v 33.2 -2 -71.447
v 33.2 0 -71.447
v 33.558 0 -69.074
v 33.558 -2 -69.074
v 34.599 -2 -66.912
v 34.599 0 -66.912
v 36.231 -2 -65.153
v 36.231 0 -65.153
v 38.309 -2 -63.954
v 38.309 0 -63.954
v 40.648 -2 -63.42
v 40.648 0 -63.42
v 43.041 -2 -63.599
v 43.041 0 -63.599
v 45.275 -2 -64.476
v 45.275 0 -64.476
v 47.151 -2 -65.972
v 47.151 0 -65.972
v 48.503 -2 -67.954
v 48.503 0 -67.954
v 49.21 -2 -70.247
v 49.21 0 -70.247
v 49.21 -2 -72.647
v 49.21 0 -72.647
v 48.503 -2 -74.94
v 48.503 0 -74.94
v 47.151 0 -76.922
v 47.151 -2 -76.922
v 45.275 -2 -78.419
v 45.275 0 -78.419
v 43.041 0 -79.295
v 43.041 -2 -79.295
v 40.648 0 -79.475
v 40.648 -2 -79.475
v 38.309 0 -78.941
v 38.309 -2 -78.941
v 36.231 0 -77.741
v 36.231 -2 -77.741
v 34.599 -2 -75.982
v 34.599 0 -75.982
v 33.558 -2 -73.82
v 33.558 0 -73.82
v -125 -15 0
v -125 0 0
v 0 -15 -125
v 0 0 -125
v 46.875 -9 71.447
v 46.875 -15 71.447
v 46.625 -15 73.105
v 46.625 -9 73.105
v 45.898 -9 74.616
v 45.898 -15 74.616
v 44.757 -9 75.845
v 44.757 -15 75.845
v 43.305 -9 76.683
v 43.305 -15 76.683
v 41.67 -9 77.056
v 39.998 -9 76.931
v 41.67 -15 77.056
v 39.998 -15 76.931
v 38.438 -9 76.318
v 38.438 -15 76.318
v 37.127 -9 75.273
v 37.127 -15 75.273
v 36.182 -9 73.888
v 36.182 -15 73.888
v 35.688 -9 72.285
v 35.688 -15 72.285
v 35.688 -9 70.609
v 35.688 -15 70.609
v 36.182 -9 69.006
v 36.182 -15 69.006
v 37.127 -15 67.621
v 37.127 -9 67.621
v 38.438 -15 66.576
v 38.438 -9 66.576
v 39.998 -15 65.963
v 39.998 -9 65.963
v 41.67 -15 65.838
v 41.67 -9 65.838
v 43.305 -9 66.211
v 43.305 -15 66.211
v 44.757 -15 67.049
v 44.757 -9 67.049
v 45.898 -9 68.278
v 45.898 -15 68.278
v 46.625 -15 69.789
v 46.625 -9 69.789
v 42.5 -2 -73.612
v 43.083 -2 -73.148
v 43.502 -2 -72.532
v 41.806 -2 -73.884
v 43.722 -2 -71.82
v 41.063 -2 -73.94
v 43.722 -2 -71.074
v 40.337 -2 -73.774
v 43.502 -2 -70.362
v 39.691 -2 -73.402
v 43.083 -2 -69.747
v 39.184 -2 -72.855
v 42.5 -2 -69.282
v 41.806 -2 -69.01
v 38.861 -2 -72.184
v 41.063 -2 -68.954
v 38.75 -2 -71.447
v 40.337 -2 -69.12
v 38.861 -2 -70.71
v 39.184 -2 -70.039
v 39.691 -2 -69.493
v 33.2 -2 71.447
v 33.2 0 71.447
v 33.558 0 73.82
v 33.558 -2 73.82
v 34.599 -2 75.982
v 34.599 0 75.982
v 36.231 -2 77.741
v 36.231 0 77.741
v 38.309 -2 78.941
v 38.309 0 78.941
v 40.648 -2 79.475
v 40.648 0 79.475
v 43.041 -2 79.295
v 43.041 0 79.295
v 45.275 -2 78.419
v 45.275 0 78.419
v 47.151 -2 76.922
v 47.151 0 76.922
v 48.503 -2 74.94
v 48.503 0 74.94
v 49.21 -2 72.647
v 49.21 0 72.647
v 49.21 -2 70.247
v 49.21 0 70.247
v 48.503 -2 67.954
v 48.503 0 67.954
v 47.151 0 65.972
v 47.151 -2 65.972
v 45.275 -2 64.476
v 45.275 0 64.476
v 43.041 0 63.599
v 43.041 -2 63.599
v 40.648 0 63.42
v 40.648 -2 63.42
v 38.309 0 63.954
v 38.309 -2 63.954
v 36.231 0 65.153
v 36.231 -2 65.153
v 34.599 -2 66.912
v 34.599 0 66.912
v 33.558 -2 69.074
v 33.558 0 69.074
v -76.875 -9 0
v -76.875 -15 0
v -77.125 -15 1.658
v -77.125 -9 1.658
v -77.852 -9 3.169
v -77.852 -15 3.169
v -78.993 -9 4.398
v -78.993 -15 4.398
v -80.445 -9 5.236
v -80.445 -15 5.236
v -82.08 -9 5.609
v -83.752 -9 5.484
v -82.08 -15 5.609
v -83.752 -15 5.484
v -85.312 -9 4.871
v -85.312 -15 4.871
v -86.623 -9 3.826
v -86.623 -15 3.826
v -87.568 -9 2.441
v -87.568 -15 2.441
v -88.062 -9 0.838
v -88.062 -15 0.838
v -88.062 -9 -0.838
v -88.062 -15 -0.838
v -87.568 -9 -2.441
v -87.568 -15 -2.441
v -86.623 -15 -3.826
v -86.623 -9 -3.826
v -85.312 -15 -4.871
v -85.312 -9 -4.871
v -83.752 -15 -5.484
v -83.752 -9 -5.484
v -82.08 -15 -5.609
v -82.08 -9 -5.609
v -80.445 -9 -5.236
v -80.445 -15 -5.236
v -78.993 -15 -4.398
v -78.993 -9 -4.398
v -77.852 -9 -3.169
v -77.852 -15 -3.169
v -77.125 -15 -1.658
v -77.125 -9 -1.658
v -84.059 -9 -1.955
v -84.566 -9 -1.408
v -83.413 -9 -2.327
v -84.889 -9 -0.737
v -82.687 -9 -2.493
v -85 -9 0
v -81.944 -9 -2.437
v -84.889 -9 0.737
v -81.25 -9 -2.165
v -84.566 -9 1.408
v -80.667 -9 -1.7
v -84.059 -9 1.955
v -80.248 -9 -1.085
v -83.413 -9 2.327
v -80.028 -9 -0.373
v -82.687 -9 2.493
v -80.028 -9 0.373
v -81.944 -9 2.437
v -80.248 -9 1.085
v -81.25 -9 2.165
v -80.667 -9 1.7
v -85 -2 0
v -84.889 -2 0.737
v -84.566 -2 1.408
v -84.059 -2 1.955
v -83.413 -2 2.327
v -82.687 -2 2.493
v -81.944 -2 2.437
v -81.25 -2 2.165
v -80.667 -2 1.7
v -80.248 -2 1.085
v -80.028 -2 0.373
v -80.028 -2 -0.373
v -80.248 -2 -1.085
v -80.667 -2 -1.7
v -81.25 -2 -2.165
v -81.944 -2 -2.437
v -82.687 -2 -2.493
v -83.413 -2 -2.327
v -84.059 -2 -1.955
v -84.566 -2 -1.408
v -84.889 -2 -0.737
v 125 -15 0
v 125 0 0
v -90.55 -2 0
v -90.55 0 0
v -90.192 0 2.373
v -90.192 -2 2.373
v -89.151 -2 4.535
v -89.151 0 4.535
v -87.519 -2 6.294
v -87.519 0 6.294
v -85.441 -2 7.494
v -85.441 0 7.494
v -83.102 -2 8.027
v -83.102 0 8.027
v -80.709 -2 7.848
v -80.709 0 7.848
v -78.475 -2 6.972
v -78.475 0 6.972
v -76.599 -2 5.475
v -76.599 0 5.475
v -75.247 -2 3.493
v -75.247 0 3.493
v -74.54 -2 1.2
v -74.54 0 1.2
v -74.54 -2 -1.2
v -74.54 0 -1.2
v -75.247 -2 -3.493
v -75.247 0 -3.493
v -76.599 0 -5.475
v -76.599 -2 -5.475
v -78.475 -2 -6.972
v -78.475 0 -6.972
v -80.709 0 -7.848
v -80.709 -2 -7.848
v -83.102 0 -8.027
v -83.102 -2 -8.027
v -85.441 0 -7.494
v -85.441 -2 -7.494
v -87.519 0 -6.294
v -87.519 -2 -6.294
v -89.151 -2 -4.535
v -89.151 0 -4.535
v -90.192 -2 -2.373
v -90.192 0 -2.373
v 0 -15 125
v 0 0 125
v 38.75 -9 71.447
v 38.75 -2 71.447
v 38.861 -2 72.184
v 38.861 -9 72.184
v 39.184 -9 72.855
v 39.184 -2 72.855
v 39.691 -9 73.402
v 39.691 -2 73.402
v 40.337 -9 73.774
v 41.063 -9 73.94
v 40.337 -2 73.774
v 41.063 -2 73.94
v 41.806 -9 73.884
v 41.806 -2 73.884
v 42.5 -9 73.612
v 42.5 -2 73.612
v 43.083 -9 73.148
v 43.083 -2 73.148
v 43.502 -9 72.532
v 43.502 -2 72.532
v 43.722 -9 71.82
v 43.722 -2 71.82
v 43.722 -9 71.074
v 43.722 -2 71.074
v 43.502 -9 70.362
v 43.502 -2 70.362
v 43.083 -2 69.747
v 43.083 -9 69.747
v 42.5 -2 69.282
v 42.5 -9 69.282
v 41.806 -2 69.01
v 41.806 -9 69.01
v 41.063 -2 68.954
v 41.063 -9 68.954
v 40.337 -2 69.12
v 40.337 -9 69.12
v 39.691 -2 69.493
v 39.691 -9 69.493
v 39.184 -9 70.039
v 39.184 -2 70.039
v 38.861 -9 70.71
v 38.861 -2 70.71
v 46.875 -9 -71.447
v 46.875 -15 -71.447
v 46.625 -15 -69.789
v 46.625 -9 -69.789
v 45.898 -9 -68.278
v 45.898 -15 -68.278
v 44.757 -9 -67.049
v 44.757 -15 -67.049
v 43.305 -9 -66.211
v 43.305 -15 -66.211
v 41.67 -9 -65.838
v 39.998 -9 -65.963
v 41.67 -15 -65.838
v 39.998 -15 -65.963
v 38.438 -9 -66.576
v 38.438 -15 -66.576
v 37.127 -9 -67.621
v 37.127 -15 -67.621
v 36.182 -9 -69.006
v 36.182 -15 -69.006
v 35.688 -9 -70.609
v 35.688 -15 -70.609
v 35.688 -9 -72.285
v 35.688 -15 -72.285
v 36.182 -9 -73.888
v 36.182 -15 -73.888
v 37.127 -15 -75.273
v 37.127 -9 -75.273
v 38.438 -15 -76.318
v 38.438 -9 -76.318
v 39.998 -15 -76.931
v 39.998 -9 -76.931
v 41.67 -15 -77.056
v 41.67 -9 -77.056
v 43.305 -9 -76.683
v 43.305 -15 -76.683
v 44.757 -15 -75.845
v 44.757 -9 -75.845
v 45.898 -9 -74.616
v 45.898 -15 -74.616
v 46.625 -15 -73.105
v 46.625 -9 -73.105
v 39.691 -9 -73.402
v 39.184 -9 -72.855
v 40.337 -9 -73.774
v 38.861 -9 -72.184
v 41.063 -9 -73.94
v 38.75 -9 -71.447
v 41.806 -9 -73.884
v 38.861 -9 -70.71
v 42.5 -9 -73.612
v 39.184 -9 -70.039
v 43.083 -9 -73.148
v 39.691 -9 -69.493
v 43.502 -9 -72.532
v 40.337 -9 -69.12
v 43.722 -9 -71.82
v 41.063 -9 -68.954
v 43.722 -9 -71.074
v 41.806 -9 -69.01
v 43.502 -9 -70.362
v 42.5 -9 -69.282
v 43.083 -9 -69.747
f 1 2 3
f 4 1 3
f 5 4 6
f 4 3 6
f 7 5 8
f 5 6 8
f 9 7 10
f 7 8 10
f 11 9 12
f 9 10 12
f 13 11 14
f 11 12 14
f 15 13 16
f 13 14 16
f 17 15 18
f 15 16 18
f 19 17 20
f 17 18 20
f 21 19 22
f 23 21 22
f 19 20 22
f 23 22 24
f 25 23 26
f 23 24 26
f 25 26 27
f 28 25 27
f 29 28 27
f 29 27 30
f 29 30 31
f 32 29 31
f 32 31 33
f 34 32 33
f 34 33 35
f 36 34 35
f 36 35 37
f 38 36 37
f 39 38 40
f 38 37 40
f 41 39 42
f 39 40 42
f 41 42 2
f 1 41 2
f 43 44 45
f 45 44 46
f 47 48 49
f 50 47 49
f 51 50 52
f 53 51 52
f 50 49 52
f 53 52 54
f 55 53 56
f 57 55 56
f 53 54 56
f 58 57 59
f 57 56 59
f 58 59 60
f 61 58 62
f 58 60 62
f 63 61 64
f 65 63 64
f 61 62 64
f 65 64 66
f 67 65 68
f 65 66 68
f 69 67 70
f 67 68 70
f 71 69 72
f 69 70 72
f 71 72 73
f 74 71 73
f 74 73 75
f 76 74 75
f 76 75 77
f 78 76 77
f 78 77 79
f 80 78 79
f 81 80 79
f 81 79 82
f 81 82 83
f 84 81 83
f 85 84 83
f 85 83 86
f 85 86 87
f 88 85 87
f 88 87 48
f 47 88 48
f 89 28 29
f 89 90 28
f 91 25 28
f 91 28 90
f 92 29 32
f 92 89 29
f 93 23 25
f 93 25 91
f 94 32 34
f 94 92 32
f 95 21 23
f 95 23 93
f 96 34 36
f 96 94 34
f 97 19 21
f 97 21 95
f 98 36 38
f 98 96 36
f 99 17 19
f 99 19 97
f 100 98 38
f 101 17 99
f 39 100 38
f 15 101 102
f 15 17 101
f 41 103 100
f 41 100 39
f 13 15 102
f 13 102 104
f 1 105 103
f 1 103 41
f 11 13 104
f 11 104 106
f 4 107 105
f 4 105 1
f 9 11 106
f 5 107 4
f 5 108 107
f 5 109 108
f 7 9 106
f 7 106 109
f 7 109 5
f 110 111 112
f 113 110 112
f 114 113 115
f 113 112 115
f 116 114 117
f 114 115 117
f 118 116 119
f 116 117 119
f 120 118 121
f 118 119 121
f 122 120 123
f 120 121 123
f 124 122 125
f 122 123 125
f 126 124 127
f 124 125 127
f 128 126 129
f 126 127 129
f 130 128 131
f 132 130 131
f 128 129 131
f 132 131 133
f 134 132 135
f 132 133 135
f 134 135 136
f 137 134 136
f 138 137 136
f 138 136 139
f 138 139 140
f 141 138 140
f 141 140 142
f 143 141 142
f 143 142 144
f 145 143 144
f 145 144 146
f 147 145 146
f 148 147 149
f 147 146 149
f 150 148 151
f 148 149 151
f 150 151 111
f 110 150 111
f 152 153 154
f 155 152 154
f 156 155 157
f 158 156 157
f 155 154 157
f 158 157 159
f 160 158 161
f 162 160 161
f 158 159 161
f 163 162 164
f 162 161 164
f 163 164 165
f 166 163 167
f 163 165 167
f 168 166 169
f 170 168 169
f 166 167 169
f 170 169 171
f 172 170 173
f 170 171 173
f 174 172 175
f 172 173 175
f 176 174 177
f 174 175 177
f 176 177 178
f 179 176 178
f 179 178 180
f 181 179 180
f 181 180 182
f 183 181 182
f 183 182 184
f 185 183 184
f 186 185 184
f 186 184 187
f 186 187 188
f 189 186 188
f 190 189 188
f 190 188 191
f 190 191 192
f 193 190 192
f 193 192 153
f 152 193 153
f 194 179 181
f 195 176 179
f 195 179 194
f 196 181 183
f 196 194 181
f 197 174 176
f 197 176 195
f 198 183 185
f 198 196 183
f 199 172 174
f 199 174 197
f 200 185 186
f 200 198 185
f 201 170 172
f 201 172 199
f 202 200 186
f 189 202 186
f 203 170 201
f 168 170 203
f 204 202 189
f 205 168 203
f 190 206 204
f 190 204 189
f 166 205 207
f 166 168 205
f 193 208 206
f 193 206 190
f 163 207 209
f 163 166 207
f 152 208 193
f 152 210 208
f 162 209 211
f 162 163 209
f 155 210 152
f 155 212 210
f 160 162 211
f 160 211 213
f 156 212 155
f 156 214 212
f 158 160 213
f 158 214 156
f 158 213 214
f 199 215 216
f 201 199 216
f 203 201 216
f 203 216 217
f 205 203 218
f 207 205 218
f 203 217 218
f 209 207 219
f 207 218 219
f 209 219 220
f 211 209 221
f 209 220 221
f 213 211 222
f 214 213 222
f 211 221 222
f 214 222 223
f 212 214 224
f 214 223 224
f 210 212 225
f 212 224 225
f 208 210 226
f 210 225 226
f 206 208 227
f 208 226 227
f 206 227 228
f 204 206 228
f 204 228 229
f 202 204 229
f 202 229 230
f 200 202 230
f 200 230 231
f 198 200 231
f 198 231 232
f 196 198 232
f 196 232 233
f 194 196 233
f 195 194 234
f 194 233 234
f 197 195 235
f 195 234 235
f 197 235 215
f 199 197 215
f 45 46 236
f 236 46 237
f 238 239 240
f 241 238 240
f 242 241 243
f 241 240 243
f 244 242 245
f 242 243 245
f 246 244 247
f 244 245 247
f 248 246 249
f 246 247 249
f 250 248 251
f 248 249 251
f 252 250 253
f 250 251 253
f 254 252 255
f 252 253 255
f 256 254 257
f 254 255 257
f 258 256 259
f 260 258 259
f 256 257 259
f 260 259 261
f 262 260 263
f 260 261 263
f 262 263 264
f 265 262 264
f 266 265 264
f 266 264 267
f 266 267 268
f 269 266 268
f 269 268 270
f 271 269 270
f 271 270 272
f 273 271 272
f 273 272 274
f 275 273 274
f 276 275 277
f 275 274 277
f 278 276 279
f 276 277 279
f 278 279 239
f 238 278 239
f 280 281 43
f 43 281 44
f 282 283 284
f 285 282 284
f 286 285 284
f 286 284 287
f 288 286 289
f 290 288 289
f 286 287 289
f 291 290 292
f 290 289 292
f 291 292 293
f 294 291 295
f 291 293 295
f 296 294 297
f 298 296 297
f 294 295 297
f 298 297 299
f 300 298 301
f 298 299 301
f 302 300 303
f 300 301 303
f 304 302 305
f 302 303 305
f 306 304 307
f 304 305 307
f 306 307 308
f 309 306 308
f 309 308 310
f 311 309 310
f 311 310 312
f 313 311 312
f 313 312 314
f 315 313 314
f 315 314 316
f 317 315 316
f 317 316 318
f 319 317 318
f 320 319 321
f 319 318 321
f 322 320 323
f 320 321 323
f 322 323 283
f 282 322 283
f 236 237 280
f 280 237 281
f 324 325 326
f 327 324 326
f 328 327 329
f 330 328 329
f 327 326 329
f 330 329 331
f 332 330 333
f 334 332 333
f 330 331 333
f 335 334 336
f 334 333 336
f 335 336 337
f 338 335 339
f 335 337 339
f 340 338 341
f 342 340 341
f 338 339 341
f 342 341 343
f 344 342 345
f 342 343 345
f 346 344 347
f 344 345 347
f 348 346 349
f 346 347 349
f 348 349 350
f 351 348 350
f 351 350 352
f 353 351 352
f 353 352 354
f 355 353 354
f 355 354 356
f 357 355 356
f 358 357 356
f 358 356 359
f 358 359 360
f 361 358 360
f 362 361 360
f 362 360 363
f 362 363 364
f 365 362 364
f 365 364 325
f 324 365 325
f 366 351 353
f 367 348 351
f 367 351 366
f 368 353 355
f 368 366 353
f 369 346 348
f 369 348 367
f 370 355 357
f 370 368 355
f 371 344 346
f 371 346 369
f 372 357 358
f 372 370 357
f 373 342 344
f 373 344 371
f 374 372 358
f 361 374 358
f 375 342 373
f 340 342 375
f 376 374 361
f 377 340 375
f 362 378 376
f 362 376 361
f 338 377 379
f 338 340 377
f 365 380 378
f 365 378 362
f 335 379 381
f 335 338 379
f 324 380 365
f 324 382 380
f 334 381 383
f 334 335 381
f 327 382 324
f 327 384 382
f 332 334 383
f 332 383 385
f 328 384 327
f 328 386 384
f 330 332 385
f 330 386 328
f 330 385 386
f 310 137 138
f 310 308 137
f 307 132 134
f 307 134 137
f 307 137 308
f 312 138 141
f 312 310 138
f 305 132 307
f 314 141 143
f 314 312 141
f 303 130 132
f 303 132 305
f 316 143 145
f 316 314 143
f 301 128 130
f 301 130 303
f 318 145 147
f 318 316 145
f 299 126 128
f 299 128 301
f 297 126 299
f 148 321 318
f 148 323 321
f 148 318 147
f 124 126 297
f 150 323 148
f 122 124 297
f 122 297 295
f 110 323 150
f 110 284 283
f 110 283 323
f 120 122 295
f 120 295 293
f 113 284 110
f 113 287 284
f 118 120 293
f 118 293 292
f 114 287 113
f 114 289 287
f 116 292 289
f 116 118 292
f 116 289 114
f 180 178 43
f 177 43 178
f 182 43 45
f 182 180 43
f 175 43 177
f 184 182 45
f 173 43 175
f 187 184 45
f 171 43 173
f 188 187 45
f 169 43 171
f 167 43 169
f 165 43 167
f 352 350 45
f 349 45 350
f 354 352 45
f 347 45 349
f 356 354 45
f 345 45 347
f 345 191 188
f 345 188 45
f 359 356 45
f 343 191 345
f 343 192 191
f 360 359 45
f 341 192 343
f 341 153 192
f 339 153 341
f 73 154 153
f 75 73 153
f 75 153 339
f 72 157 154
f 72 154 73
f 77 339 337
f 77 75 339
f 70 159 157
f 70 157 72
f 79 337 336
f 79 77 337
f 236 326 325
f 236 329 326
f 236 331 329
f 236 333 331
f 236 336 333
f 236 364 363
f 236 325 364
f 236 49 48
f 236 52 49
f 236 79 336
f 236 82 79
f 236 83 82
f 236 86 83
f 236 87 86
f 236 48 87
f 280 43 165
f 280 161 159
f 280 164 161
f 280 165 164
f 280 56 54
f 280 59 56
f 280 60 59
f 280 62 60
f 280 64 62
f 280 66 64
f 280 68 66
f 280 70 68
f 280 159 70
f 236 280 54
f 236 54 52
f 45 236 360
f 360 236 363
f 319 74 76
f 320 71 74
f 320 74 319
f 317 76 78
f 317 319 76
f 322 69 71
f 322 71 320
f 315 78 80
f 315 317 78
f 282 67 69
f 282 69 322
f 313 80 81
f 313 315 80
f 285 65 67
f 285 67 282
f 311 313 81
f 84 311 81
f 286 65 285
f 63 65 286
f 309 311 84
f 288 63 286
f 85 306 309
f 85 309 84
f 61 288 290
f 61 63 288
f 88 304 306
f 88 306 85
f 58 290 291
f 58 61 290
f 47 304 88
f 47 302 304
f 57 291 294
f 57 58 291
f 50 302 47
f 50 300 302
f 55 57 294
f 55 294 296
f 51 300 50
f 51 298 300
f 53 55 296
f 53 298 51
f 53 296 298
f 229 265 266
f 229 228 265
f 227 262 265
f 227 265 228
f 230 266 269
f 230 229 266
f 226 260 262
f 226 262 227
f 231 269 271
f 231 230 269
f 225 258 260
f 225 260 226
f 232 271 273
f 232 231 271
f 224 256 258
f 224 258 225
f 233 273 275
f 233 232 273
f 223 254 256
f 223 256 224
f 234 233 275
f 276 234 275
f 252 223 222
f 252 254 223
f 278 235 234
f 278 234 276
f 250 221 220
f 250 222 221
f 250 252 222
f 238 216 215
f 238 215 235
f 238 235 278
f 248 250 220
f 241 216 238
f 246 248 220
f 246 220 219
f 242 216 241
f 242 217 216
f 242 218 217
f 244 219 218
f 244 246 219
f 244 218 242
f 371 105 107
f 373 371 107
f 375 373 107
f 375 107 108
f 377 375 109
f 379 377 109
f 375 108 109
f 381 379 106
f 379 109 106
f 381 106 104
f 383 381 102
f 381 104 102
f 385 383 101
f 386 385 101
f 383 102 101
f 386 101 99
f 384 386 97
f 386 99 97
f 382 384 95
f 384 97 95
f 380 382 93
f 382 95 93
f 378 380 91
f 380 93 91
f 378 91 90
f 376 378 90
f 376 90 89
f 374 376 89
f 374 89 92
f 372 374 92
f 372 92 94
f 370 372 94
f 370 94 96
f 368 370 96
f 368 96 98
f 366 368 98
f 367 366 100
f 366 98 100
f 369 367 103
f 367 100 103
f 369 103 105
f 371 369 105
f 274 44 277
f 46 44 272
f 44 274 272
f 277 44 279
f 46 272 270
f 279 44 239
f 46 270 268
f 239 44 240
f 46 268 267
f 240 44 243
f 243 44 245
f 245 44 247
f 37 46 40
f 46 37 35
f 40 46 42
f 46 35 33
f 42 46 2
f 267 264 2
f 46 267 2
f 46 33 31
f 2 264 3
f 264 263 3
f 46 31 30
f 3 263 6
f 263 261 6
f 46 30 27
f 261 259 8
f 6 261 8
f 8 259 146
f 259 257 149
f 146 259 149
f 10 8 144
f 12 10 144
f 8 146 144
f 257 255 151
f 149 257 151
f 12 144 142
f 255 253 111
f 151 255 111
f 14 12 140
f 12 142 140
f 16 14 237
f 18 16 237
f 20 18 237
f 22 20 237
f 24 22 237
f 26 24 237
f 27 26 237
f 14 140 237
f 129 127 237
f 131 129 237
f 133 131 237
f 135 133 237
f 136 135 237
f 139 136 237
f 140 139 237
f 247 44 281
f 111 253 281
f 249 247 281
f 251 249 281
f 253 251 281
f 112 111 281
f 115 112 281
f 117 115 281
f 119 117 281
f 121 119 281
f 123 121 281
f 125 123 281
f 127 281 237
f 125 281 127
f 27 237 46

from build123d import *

# Parameters (mm, degrees)
F1_DEPTH       = 15
F3_D           = 5
F3_CBORE_D     = 11.25
F3_CBORE_DEPTH = 6
F4_R           = 8.05
F5_DEPTH       = 2


with BuildPart() as f1:
    # F0 (on Front) → F1 (new body)
    with BuildSketch(Plane.XZ):
        Polygon((125, 0), (0, 125), (-125, 0), (0, -125), align=None)
    extrude(amount=F1_DEPTH)

    # F3 (through all)
    with Locations(Plane.XZ.offset(15)):
        with Locations((-82.5, 0), (41.25, -71.4470958122), (41.25, 71.4470958122)):
            CounterBoreHole(F3_D / 2, F3_CBORE_D / 2, F3_CBORE_DEPTH)

    # F4 (on face) → F5 (cut)
    with BuildSketch(Plane(origin=(0, 0, 0), x_dir=(-1, 0, 0), z_dir=(0, 1, 0))):
        with Locations((82.5, 0)):
            Circle(F4_R)
        with Locations((-41.25, -71.4470958122)):
            Circle(F4_R)
        with Locations((-41.25, 71.4470958122)):
            Circle(F4_R)
    extrude(amount=-F5_DEPTH, mode=Mode.SUBTRACT)


solid = f1.part
